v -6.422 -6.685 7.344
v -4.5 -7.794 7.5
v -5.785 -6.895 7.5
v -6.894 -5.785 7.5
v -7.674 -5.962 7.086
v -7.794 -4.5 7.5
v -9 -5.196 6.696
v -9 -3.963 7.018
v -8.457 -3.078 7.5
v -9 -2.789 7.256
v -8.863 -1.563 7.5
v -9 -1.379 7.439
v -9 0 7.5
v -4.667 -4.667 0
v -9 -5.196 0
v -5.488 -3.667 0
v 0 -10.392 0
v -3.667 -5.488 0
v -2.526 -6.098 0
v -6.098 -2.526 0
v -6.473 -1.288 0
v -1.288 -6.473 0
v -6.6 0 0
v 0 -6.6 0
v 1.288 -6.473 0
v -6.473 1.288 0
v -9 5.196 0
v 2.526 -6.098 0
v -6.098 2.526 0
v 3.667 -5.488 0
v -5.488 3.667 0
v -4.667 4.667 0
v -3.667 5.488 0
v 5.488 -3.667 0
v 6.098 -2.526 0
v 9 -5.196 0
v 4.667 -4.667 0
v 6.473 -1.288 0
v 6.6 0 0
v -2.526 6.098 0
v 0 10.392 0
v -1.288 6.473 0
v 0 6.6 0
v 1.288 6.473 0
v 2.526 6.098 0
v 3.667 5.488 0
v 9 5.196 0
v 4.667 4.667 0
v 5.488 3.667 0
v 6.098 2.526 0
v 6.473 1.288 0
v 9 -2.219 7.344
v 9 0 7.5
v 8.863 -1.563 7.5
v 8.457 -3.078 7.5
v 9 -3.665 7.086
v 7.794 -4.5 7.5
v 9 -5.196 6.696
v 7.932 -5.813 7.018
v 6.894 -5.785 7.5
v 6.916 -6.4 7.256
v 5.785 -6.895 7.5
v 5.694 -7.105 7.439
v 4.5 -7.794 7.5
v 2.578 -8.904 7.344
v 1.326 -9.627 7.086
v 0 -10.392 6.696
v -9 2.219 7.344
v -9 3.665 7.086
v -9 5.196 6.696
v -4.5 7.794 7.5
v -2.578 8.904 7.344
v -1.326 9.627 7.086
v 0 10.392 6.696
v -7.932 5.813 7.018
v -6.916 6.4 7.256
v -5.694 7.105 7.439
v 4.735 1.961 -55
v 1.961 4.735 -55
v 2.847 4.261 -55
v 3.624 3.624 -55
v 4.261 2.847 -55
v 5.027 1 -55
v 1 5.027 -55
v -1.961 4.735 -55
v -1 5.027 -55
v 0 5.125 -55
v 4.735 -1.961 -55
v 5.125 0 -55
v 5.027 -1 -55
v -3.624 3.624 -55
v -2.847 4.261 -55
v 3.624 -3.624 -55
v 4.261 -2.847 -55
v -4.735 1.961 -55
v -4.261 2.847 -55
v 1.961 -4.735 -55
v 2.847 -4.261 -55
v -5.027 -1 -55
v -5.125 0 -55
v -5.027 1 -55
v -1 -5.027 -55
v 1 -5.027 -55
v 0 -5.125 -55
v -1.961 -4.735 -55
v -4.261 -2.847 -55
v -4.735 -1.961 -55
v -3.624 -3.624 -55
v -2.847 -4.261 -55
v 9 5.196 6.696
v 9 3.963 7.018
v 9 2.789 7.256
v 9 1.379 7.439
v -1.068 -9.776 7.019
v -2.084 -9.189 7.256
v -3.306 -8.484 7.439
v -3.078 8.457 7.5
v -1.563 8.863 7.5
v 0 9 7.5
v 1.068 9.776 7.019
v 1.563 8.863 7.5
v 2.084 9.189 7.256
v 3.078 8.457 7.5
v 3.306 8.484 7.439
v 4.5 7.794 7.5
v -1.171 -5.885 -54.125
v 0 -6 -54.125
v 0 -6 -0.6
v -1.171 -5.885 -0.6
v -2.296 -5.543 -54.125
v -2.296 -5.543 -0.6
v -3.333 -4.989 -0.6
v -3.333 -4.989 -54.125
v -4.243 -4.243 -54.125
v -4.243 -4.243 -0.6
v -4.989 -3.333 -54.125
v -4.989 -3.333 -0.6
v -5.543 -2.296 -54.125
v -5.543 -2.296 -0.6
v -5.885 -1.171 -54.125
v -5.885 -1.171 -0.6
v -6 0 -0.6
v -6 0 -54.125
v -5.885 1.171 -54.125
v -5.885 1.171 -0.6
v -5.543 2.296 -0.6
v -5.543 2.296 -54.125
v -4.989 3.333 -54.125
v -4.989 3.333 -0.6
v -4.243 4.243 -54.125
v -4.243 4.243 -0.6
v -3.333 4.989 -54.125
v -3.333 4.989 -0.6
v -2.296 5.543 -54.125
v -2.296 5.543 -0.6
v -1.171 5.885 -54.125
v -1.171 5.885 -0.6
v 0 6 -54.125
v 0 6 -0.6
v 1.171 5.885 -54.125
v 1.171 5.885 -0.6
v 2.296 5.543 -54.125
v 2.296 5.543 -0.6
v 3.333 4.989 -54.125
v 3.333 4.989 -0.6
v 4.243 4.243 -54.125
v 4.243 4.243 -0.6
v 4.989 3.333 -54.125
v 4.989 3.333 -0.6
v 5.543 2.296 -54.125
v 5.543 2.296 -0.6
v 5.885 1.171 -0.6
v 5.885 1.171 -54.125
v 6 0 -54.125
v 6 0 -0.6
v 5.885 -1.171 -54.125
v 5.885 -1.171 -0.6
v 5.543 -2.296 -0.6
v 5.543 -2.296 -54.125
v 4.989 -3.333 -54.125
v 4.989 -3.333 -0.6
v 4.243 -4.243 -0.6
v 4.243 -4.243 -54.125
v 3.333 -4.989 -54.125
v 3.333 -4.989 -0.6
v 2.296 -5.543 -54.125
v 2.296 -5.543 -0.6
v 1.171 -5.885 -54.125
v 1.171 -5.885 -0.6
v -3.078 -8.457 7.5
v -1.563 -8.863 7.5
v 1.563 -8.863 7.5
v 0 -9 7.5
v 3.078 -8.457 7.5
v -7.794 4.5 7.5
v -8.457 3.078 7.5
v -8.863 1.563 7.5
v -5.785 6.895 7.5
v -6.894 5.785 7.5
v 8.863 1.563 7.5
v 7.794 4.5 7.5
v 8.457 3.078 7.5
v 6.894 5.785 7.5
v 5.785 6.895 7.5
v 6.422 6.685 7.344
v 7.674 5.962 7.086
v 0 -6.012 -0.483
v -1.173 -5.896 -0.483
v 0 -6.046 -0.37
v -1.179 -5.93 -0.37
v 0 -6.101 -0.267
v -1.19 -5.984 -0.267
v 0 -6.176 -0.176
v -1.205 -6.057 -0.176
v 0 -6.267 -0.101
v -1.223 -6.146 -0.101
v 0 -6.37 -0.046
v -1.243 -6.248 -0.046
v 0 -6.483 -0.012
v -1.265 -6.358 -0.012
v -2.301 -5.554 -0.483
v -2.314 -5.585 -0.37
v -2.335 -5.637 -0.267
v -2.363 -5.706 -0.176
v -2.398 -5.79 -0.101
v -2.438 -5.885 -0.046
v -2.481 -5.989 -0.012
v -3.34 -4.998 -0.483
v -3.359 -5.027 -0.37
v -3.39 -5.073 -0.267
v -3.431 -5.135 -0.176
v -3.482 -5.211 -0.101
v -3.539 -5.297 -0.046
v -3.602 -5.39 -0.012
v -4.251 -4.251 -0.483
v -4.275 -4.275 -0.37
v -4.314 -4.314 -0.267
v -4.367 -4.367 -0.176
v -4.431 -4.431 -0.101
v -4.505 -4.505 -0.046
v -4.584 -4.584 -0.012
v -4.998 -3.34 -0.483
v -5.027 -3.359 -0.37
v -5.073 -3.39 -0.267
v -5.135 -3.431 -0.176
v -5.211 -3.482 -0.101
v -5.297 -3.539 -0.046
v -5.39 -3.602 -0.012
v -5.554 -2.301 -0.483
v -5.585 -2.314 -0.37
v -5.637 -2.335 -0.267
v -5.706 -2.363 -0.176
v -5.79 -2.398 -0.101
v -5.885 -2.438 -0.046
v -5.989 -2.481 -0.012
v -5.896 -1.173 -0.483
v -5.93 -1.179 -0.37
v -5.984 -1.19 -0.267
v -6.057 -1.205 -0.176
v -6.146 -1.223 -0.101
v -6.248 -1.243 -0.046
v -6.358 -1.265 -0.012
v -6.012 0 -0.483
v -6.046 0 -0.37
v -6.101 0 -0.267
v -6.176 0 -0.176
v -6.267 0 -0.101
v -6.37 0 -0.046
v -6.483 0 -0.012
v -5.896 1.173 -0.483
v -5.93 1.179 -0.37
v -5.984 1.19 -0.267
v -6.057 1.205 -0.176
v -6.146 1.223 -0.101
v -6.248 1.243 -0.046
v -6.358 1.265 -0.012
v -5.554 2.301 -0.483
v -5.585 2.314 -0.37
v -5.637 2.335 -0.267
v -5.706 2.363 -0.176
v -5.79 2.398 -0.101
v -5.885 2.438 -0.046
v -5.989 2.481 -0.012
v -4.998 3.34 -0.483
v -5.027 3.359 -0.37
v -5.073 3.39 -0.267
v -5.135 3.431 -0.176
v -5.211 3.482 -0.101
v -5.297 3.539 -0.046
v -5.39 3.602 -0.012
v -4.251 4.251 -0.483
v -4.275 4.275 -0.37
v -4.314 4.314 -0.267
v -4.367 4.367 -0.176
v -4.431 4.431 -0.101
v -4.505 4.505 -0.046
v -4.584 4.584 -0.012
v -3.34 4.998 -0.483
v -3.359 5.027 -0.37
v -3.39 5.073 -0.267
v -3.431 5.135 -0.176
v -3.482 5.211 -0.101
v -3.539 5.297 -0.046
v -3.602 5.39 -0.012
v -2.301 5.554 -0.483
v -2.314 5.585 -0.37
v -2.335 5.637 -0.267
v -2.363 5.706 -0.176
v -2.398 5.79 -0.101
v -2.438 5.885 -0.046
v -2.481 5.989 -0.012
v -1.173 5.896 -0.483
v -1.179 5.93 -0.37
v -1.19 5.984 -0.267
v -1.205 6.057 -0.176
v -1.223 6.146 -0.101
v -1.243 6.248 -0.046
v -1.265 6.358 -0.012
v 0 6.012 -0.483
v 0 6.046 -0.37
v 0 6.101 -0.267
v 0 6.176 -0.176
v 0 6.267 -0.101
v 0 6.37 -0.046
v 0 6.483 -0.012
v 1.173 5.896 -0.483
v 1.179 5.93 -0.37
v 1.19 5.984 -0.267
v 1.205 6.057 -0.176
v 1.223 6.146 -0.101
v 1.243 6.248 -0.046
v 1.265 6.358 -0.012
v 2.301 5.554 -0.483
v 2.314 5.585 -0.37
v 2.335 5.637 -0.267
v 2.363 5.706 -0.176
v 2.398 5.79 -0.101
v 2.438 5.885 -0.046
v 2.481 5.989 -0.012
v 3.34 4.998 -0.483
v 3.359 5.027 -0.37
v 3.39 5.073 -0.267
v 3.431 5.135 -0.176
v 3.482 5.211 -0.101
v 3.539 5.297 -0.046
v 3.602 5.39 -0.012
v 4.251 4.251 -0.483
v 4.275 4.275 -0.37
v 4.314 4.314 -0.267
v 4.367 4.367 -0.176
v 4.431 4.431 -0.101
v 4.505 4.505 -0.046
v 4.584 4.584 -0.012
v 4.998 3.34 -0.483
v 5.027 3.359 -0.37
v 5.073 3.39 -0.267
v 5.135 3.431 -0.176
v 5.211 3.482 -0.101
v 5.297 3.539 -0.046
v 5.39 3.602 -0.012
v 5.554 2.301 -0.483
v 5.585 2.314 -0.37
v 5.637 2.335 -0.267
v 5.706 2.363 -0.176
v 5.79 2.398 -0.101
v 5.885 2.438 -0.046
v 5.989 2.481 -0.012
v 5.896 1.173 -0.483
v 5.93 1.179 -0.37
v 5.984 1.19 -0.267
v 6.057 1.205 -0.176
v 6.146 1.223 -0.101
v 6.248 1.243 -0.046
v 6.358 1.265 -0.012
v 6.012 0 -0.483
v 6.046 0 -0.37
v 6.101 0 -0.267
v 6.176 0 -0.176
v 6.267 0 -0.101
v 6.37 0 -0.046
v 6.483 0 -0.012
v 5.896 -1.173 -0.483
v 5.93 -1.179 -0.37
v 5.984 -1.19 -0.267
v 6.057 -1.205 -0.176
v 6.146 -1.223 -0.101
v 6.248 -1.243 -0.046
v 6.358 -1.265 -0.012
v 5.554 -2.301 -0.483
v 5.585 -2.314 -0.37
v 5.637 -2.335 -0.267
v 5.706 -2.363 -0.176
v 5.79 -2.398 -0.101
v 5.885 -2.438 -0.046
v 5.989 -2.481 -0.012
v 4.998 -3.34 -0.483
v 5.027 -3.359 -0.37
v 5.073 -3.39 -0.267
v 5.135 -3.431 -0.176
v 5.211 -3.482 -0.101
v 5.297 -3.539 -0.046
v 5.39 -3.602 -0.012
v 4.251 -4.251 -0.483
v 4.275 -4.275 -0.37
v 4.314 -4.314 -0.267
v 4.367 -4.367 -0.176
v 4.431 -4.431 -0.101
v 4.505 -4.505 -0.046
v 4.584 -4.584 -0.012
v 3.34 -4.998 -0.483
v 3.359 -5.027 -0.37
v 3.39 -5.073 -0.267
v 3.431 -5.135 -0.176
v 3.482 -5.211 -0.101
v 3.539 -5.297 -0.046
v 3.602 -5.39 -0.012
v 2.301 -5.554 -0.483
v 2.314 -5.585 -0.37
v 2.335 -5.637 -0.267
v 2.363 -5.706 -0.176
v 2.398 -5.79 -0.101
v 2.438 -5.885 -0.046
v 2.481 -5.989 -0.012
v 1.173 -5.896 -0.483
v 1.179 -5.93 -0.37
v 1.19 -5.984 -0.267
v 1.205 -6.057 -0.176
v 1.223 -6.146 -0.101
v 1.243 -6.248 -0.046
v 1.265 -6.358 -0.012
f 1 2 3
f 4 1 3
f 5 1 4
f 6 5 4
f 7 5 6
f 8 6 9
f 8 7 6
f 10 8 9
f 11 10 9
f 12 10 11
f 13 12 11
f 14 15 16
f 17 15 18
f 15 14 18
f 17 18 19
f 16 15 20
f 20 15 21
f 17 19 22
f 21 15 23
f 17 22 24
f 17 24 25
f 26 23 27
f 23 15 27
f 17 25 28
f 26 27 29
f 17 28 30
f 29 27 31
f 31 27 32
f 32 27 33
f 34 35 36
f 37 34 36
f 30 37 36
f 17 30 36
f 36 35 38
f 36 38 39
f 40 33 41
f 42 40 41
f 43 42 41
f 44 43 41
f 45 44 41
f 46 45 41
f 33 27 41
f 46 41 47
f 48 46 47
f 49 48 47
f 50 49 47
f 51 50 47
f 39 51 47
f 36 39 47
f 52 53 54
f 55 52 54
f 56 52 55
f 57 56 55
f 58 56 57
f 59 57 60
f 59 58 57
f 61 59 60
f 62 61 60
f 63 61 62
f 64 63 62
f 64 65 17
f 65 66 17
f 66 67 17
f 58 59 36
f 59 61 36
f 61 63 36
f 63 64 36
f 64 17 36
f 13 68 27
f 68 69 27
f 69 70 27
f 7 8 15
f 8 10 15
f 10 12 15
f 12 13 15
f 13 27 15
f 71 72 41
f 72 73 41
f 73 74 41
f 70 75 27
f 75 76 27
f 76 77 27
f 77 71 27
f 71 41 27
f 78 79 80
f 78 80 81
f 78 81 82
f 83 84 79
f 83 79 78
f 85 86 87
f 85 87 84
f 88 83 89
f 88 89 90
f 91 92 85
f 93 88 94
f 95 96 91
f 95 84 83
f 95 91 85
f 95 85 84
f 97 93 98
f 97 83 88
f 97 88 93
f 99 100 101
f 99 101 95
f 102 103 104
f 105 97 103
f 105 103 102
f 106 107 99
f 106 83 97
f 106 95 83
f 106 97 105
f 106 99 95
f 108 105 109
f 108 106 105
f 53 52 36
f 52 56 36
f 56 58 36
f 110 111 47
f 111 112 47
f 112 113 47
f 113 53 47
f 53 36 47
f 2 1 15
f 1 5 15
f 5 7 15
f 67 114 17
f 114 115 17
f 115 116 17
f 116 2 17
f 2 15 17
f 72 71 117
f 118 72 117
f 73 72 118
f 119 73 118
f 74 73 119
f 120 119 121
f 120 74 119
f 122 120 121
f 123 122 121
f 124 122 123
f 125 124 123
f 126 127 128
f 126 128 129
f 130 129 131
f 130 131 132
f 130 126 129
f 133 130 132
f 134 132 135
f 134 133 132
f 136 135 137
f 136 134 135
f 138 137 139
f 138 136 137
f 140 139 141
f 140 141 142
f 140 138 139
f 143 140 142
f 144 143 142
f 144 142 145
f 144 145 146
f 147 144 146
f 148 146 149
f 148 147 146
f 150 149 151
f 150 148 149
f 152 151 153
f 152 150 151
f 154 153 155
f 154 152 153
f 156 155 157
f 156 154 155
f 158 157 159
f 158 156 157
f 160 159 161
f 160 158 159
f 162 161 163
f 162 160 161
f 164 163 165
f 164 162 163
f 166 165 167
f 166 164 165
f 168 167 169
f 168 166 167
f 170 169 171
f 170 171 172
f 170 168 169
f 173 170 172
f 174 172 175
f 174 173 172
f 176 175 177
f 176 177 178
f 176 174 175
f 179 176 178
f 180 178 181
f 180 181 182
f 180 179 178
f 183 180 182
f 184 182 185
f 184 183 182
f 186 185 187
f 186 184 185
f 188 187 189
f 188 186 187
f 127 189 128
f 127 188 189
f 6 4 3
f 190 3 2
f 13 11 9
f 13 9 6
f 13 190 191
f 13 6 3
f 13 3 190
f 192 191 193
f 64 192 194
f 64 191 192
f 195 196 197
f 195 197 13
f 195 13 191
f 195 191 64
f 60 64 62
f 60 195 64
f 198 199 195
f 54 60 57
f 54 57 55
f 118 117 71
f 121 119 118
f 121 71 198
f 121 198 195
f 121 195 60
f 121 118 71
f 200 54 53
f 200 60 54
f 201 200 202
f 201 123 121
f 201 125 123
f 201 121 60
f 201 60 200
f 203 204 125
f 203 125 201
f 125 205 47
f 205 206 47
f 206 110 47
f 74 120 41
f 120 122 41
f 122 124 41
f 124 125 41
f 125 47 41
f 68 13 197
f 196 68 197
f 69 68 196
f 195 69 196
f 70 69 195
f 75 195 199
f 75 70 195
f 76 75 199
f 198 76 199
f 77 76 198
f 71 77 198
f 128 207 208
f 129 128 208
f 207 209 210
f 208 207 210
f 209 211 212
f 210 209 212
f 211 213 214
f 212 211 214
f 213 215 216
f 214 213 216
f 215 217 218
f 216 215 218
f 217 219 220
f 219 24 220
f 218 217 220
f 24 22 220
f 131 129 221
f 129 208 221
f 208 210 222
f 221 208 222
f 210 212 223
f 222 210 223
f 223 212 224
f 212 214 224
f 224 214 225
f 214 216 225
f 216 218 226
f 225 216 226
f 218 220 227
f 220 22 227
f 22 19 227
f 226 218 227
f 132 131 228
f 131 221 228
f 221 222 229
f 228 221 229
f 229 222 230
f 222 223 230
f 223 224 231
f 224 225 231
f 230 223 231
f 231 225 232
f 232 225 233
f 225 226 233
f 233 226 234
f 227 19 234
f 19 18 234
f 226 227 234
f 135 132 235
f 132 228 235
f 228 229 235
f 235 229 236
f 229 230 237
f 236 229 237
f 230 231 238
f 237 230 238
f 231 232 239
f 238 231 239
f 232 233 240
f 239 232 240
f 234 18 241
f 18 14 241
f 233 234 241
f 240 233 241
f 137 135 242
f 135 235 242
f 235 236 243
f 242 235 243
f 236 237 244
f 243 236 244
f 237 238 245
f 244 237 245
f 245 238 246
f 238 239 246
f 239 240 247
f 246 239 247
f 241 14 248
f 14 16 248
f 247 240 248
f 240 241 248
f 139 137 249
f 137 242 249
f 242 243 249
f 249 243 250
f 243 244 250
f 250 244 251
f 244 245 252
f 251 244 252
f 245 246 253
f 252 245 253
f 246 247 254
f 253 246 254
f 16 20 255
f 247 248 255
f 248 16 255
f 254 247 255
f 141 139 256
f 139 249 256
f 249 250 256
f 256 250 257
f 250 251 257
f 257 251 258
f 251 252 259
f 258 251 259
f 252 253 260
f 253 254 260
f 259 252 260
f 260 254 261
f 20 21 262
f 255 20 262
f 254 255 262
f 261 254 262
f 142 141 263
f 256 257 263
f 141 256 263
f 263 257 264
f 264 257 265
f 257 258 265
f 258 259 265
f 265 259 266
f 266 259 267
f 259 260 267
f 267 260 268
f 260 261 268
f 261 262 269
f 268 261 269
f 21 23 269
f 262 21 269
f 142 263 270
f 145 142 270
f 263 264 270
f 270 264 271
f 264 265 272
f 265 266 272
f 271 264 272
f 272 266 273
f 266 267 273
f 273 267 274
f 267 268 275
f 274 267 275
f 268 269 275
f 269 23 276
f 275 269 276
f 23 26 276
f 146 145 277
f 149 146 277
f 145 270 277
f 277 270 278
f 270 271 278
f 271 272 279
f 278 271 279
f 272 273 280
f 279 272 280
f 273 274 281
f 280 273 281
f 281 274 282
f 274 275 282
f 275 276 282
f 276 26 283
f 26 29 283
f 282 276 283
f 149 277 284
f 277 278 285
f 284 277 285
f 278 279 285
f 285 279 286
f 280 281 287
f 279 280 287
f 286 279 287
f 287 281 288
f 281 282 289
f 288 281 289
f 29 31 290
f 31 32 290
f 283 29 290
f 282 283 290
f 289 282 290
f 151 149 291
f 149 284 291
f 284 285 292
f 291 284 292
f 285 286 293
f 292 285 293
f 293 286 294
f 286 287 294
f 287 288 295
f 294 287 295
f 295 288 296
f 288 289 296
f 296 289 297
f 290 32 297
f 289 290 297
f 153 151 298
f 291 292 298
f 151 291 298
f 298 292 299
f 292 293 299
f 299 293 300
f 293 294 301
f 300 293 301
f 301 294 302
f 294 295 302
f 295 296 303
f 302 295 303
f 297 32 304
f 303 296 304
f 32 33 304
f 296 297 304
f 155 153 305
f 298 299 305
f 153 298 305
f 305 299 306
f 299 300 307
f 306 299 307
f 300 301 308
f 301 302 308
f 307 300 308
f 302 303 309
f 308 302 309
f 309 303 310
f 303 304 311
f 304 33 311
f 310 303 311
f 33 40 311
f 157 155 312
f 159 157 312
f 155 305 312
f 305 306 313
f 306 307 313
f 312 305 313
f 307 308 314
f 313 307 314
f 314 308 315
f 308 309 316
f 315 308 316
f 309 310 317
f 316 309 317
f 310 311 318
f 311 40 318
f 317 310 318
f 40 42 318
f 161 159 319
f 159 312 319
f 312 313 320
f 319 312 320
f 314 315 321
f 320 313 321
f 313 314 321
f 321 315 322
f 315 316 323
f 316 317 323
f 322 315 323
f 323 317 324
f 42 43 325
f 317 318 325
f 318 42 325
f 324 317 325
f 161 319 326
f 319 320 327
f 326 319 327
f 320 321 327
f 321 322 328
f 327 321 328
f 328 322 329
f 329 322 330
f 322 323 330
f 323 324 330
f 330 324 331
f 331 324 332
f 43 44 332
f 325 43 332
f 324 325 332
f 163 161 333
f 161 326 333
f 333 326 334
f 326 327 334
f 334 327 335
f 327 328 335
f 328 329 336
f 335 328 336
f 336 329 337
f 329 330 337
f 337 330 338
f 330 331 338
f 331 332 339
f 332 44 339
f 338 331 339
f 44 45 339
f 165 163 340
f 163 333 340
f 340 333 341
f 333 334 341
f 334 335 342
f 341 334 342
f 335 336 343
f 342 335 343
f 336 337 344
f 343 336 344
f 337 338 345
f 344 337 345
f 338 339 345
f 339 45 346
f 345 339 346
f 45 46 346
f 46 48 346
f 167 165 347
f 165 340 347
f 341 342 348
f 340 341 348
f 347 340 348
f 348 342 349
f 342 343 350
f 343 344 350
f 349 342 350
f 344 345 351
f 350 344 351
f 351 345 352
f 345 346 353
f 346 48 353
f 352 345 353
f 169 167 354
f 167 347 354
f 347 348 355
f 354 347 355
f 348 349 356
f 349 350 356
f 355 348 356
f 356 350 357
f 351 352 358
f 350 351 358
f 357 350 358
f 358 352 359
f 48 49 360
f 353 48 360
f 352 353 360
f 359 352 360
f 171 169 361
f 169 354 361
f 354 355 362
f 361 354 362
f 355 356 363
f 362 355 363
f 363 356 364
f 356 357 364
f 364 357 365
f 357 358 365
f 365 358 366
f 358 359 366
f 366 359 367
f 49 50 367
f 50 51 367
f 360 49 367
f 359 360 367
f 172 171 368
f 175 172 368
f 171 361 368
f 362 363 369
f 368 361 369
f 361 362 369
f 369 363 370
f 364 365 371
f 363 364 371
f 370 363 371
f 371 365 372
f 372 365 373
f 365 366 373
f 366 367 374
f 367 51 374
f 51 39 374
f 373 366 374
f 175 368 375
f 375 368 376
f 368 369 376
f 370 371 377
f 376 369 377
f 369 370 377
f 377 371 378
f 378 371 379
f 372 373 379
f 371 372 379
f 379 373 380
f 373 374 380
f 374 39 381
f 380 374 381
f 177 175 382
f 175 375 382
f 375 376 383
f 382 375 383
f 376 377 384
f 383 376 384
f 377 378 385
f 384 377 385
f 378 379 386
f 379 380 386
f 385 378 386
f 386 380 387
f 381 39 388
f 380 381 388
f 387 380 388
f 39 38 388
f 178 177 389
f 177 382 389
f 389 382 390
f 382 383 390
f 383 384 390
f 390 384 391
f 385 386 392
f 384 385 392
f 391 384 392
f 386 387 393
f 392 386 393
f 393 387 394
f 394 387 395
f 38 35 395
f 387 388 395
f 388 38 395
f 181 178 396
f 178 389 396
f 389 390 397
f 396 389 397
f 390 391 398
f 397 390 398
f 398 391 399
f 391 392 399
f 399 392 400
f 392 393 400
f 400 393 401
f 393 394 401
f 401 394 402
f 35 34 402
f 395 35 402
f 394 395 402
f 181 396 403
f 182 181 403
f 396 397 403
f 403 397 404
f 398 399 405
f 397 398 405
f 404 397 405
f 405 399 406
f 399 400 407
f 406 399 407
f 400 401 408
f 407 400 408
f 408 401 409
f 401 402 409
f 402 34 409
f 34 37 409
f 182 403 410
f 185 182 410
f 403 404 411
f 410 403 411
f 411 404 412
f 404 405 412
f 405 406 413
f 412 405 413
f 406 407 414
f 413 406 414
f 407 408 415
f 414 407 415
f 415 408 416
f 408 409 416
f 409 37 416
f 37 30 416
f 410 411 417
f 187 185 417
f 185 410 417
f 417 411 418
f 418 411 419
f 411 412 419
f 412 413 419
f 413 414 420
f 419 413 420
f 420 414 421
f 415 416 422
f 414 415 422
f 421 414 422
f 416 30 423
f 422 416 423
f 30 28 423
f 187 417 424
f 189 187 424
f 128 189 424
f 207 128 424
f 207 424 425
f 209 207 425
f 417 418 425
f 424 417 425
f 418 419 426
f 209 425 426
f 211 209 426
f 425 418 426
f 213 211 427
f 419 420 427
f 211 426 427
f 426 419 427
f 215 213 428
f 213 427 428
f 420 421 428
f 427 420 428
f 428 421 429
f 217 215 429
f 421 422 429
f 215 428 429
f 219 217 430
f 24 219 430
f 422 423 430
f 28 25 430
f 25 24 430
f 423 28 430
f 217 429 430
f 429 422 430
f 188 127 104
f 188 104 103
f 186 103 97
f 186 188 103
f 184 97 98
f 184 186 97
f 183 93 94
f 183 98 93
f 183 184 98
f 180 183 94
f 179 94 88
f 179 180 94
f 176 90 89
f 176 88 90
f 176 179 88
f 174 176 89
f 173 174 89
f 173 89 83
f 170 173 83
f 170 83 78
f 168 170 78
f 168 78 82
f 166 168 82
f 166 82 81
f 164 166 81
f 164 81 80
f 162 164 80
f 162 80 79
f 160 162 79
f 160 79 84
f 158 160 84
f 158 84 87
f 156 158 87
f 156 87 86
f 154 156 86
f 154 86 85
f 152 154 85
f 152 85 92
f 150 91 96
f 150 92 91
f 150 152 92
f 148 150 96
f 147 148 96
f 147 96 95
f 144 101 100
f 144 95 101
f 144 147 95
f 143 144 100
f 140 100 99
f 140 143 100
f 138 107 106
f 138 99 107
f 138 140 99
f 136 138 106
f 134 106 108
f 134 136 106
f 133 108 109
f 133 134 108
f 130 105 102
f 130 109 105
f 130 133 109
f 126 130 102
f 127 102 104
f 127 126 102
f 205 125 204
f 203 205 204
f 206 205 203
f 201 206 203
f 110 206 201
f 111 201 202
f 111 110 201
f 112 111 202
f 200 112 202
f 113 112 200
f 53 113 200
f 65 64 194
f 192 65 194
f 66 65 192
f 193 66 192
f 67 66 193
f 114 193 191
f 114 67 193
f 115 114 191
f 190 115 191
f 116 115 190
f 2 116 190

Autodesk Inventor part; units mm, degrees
ref_plane "WorkPlane1" through (0, 0, 0) normal (0, 0, 1) x (1, 0, 0)
sketch "Skizze1" plane through (0, 0, 0) normal (0, 0, 1) x (1, 0, 0)
  point P0 (0, 0)
sketch "Skizze2" plane through (0, 0, 0) normal (0, 0, 1) x (1, 0, 0)
  line L0 (-9, 5.1963) -> (-9, -5.1963)
  line L1 (0, 10.3922) -> (-9, 5.1963)
  line L2 (9, 5.1963) -> (0, 10.3922)
  line L3 (9, -5.1963) -> (9, 5.1963)
  line L4 (0, -10.3922) -> (9, -5.1963)
  line L5 (-9, -5.1963) -> (0, -10.3922)
  circle A0 centre (0, 0) radius 9 construction
  dimension "d1" = 18
  dimension "d29" = 0
  dimension "d30" = 0
extrude "Extrusion1" add sketch "Skizze2" along normal blind 7.5
sketch "Skizze3" plane through (0, 0, 0) normal (1, 0, 0) x (0, 1, 0)
  line L0 (9, 7.5) -> (10.4922, 7.5)
  line L1 (10.4922, 6.6385) -> (9, 7.5)
  line L2 (10.4922, 7.5) -> (10.4922, 6.6385)
  line L3 (0, -1.5) -> (0, 9) projected
  line L4 (10.3922, 0) -> (10.3922, 7.5) projected
  dimension "d25" = 0.1
  dimension "d26" = 0
  dimension "d27" = 60
  dimension "d28" = 9
revolve "Drehung1" cut sketch "Skizze3" angle 360 about axis through (0, 0, -10) along (0, 0, 1)
sketch "Skizze4" plane through (0, 0, 0) normal (1, 0, 0) x (0, 1, 0)
  line L0 (0, -55) -> (0, 0)
  line L1 (-6, -55) -> (0, -55)
  line L2 (-6, 0) -> (-6, -55)
  line L3 (0, 0) -> (-6, 0)
  line L4 (0, -55) -> (0, 0)
  line L5 (-7.2, 0) -> (1.2, 0) projected
  line L6 (0, -66) -> (0, 11) projected
  dimension "d18" = 6
  dimension "d20" = 55
  dimension "d33" = 0
  dimension "d34" = 0
revolve "Drehung2" add sketch "Skizze4" angle 360 about axis through (0, 0, -55) along (0, 0, -1)
chamfer "Fase1" distance 0.875 angle 45 1 edges at (0, 6, -55)
fillet "Rundung1" radius 0.6 1 edges at (0, 6, 0)
thread "Gewinde1" size "M12x1.75" class "6g" standard "ISO Metric profile" length 30
ref_plane "MSC_PF1" through (0, 0, 0) normal (1, 0, 0) x (0, 1, 0)
ref_plane "MSC_PT1" through (0, 0, 0) normal (0, 0, -1) x (-1, 0, 0)
equation "\"d22\" = 0.5 * PTC"
equation "\"d23\" = 0.5 * PTC"
equation "\"d1\" = ParS"
equation "\"d6\" = ParK"
equation "\"d24\" = r"
equation "\"d28\" = 0.5 * ParS"
equation "\"d18\" = 0.5 * NND"
equation "\"d20\" = NLG"
equation "\"NND\" = 12"
equation "\"NLG\" = 55"
equation "\"PTC\" = 1.75"
equation "\"ParK\" = 7.5"
equation "\"ParS\" = 18"
equation "\"msp_es\" = 0.577367 * ParS"
equation "\"r\" = 0.6"
equation "\"THREADDIA\" = NND"
equation "\"K1\" = 4.94"
properties part number "DIN EN ISO 4016 - M12x55" material "Stahl"
